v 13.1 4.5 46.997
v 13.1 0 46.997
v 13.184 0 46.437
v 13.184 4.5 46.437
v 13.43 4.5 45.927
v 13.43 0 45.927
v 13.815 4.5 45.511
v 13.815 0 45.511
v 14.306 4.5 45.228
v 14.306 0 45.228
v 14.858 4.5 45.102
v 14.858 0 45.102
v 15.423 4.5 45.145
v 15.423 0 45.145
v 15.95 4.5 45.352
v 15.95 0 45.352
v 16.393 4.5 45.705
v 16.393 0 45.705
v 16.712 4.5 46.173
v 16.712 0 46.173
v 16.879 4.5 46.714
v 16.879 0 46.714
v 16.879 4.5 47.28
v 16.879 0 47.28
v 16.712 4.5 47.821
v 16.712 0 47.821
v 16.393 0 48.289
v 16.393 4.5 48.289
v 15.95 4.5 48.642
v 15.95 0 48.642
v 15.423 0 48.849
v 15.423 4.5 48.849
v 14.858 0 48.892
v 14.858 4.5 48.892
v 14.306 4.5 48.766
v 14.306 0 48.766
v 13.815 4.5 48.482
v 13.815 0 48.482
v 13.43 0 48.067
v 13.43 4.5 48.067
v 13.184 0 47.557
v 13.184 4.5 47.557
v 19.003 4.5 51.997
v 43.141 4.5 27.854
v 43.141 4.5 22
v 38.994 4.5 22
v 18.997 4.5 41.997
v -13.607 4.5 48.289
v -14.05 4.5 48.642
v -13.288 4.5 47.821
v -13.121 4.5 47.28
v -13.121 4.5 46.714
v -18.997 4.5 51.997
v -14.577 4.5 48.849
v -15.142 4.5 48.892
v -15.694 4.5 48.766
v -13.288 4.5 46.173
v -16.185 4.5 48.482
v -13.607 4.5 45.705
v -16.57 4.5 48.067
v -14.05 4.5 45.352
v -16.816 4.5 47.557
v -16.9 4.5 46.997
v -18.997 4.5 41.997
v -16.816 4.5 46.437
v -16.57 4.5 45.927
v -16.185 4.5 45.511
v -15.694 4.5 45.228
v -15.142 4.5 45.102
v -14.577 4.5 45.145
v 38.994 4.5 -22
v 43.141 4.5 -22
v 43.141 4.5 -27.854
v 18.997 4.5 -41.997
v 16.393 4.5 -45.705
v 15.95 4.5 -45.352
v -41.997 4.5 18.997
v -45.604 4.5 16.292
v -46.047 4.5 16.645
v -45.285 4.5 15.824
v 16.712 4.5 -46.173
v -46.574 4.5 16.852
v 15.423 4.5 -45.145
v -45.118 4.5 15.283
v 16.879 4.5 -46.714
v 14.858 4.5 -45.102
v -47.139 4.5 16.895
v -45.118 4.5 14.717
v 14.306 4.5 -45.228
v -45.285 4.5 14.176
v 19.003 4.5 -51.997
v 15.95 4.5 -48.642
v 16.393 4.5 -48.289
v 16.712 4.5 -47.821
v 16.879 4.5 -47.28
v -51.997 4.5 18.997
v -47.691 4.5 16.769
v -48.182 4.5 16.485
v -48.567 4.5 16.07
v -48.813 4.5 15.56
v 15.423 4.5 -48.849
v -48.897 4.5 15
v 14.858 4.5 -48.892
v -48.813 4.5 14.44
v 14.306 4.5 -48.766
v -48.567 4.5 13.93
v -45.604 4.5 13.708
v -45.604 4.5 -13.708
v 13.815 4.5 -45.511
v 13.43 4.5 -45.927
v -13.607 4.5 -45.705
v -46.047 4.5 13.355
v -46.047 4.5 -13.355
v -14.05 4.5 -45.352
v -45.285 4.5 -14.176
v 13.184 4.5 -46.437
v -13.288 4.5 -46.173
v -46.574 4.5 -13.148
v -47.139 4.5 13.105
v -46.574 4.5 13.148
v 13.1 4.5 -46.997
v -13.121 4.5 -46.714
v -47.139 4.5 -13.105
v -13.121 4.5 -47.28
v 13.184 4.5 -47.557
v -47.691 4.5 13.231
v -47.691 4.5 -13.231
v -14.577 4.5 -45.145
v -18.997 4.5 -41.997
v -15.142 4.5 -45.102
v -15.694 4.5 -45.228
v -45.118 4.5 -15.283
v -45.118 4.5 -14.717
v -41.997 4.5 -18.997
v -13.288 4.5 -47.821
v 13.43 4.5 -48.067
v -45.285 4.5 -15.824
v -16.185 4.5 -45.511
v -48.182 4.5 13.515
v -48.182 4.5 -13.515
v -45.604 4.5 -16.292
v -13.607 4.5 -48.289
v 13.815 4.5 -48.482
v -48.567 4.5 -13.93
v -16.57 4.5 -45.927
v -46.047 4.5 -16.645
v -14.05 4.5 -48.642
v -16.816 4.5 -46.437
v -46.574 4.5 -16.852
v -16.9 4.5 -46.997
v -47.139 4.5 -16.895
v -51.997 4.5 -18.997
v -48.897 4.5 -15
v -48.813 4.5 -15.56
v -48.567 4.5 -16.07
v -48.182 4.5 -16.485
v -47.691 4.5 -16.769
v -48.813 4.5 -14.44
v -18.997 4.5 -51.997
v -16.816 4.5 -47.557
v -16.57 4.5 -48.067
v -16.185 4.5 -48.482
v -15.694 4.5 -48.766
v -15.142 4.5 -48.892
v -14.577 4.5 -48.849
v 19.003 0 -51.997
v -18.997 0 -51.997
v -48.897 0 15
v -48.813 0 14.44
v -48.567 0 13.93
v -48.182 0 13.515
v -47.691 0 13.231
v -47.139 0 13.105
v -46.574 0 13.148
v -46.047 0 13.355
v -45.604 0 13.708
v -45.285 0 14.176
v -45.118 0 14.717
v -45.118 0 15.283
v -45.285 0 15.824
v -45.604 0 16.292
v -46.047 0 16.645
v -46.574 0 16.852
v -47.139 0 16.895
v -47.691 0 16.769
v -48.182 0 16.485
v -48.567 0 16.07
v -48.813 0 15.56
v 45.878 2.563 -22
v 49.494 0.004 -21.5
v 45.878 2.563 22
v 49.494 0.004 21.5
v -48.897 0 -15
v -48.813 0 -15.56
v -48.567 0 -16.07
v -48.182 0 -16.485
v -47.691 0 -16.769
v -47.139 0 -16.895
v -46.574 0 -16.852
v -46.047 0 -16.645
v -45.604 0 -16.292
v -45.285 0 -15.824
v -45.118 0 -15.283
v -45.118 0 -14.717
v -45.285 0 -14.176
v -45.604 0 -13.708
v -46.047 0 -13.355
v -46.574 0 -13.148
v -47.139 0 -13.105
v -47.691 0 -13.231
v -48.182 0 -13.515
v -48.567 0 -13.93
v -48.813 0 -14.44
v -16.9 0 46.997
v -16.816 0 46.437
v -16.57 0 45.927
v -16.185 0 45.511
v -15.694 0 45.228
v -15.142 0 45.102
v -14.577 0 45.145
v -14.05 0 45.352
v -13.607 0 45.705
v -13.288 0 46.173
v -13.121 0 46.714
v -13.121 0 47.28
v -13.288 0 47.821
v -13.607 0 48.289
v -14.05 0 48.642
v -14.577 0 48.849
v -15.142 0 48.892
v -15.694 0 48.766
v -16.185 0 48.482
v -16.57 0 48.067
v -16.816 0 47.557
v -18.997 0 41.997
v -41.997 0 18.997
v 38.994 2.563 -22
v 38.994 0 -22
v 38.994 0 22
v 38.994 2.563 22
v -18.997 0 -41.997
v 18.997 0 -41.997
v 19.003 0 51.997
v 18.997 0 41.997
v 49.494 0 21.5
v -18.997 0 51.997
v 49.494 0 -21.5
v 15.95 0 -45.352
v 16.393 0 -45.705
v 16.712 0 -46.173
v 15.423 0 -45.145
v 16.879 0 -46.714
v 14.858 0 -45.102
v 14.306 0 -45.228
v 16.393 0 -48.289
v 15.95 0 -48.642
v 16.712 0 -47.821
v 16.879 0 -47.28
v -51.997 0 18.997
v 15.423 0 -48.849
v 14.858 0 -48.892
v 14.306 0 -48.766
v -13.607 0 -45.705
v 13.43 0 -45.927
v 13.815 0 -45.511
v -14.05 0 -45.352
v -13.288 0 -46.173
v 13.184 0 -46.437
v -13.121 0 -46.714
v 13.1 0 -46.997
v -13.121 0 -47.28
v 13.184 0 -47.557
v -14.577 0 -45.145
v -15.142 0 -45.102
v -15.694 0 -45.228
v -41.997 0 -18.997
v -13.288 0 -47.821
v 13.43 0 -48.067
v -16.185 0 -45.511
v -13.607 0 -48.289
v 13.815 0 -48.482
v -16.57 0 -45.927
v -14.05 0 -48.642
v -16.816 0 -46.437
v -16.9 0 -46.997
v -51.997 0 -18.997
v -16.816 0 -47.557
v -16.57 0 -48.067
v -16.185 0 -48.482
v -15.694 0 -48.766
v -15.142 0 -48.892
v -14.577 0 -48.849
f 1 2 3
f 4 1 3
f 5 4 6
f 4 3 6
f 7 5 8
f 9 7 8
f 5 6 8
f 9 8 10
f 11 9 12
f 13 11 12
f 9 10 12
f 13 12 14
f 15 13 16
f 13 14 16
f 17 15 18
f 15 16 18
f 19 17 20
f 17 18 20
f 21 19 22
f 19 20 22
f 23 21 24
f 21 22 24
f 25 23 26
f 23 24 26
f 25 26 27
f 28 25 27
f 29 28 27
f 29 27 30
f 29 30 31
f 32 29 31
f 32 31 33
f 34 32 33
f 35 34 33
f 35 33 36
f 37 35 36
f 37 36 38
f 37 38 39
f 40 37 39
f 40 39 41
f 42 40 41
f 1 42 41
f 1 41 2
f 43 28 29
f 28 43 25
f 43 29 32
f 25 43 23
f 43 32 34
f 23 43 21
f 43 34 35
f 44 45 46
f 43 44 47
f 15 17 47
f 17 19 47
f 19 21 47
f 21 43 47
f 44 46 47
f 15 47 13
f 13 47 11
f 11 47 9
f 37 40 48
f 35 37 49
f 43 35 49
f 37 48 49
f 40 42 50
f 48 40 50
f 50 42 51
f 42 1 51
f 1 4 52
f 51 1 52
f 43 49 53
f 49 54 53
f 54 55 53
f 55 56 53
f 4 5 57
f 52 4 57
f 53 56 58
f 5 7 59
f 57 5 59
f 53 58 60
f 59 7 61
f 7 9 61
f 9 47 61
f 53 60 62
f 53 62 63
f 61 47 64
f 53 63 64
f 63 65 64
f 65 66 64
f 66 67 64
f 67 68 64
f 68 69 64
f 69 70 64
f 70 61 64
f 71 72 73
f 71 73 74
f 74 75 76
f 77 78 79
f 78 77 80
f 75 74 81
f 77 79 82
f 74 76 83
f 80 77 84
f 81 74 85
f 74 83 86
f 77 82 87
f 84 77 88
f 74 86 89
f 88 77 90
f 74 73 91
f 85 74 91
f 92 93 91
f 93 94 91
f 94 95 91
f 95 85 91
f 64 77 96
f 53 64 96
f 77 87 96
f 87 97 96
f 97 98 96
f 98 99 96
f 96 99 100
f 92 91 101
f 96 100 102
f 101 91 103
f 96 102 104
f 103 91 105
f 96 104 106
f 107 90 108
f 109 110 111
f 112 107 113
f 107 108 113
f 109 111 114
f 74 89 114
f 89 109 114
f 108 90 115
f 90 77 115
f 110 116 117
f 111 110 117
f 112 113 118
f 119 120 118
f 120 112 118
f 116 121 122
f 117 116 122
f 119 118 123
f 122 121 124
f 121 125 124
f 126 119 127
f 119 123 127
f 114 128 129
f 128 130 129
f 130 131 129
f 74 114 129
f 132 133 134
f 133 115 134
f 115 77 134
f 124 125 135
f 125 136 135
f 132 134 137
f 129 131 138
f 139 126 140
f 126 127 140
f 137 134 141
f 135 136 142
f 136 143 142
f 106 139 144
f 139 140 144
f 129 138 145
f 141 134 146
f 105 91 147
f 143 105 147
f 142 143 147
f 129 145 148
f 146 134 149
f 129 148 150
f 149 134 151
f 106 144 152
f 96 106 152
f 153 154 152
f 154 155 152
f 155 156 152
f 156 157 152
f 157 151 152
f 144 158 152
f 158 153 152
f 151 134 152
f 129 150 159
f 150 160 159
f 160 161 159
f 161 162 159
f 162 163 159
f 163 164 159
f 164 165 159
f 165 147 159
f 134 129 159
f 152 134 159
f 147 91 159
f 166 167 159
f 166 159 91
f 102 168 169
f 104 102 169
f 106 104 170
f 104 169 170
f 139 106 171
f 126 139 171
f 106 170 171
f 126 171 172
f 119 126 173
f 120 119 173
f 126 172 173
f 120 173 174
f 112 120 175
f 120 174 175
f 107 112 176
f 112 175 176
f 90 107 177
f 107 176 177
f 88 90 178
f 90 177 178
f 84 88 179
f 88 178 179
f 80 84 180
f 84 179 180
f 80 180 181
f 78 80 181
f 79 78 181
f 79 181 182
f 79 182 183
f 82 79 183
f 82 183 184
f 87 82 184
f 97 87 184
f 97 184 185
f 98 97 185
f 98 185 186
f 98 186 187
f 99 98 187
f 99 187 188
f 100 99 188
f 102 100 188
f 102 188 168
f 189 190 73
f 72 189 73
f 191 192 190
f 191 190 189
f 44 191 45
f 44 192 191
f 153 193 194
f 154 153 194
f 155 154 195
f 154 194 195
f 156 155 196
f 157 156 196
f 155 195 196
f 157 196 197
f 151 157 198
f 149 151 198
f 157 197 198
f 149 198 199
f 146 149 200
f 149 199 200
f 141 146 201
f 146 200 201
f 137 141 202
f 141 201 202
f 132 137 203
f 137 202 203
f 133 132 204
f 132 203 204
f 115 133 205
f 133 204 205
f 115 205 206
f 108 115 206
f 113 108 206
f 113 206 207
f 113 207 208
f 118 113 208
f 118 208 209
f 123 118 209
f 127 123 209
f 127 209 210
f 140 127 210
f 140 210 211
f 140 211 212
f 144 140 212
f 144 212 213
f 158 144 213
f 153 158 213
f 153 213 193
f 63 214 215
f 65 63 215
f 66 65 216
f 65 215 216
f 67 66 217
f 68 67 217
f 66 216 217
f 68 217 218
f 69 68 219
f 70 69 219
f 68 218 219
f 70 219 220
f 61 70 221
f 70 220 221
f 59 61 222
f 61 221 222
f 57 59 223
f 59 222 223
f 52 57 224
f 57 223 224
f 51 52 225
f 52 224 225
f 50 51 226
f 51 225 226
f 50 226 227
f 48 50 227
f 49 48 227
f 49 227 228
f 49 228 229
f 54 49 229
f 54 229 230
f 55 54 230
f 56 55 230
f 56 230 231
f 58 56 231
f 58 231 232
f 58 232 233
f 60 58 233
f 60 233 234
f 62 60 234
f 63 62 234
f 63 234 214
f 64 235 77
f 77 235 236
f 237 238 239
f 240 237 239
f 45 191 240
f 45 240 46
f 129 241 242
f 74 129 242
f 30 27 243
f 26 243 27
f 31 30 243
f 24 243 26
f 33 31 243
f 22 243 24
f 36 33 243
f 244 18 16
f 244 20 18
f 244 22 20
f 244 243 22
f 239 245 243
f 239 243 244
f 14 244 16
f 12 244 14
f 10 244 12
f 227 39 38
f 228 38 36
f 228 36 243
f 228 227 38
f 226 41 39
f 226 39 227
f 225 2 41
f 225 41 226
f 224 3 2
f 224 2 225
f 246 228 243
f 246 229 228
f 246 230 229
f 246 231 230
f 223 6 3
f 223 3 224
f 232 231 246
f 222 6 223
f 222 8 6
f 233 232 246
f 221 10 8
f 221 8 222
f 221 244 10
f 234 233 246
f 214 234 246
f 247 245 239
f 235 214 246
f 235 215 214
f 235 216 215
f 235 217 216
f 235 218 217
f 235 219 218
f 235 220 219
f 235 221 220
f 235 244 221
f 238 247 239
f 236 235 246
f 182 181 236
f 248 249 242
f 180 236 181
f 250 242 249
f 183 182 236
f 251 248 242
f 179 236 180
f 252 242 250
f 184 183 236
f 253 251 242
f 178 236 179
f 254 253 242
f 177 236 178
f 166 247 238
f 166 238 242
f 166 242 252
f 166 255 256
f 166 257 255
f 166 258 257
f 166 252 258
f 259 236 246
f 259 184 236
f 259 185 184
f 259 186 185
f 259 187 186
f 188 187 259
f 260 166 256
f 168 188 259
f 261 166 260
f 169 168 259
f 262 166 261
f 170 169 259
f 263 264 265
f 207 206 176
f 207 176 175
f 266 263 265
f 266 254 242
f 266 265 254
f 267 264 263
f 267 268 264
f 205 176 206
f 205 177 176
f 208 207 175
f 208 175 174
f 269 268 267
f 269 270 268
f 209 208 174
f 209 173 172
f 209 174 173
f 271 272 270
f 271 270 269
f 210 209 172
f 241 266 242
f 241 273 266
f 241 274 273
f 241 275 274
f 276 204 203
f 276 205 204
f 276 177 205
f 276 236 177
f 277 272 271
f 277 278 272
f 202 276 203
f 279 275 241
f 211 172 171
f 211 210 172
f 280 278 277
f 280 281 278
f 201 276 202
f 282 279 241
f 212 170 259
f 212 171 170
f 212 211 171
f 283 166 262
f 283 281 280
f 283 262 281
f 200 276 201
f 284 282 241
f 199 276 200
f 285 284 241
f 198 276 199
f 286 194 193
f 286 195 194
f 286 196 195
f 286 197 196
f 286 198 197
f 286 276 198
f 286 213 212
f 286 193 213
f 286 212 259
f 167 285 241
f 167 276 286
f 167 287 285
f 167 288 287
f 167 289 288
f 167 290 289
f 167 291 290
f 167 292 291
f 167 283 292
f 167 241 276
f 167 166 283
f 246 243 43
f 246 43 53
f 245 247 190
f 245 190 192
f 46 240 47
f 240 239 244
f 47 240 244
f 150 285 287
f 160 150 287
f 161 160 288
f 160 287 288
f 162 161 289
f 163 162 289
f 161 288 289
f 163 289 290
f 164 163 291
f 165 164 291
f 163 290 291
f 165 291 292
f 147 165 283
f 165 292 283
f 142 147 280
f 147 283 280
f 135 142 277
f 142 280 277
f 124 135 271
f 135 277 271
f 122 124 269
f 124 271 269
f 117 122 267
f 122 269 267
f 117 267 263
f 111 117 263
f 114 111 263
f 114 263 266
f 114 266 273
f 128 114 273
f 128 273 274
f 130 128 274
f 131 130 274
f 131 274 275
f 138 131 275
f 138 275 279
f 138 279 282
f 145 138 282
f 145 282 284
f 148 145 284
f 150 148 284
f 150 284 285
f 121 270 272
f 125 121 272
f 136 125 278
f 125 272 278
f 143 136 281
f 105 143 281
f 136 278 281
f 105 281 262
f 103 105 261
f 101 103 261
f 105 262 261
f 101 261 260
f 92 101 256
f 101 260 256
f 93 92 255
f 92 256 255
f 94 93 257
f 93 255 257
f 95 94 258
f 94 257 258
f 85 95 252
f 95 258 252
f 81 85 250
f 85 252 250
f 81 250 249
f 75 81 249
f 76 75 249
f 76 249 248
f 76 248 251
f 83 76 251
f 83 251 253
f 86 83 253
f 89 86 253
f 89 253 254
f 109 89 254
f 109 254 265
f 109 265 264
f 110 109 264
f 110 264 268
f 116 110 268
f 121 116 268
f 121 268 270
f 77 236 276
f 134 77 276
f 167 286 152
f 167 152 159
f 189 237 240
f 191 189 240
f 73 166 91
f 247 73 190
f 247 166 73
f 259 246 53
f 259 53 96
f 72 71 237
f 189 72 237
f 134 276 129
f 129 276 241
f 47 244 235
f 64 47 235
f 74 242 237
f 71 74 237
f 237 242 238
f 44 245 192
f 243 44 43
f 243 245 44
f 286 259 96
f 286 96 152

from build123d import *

# Parameters (mm, degrees)
BOSS_EXTRUDE3_DEPTH             = 4.5
CUT_EXTRUDE4_DEPTH              = 96.5
CUT_EXTRUDE5_DEPTH              = 32.5
F_4_0MM_PRESS_DOWEL_HOLE3_D     = 3.8
F_4_0MM_PRESS_DOWEL_HOLE3_DEPTH = 57
F_4_0MM_PRESS_DOWEL_HOLE3_TIP   = 4.587005769


with BuildPart() as part:
    # Sketch9 → Boss-Extrude3 (new body)
    with BuildSketch(Plane(origin=(0, 0, 0), x_dir=(1, 0, 0), z_dir=(0, 1, 0))):
        Polygon((19.003020228, -51.996979772), (-18.996979772, -51.996979772), (-51.996979772, -18.996979772), (-51.996979772, 18.996979772), (-18.996979772, 51.996979772), (19.003020228, 51.996979772), (49.493959544, 21.5), (49.493959544, -21.5), align=None)
        Polygon((-41.996979772, -18.996979772), (-41.996979772, 18.996979772), (-18.996979772, 41.996979772), (18.996979772, 41.996979772), (38.993959544, 22), (38.993959544, -22), (18.996979772, -41.996979772), (-18.996979772, -41.996979772), align=None, mode=Mode.SUBTRACT)
    extrude(amount=BOSS_EXTRUDE3_DEPTH)

    # Sketch13 → Cut-Extrude4 (cut)
    with BuildSketch(Plane.XY.offset(51.996979772)):
        Polygon((64.276727826, 15.051195438), (49.5, 0), (43.14121867, 4.5), (43.14121867, 18.660375199), align=None)
    extrude(amount=-CUT_EXTRUDE4_DEPTH, mode=Mode.SUBTRACT)

    # Sketch14 → Cut-Extrude5 (cut)
    with BuildSketch(Plane.ZY.offset(-38.993959544)):
        Polygon((-22, 4.5), (-22, 2.563194296), (22, 2.563194296), (22, 4.5), (18.996979772, 4.5), (-18.996979772, 4.5), align=None)
    extrude(amount=-CUT_EXTRUDE5_DEPTH, mode=Mode.SUBTRACT)

    # Ø4.0mm Press Dowel Hole3
    with Locations(Plane(origin=(0, 4.5, 0), x_dir=(1, 0, 0), z_dir=(0, 1, 0))):
        with Locations((-46.996979772, -15), (-15, 46.996979772), (-46.996979772, 15), (15, 46.996979772), (15, -46.996979772), (-15, -46.996979772)):
            Hole(F_4_0MM_PRESS_DOWEL_HOLE3_D / 2, depth=F_4_0MM_PRESS_DOWEL_HOLE3_DEPTH)
            with Locations((0, 0, -(F_4_0MM_PRESS_DOWEL_HOLE3_DEPTH + F_4_0MM_PRESS_DOWEL_HOLE3_TIP / 2))):  # 45° drill point
                Cone(0, F_4_0MM_PRESS_DOWEL_HOLE3_D / 2, F_4_0MM_PRESS_DOWEL_HOLE3_TIP, mode=Mode.SUBTRACT)


solid = part.part
